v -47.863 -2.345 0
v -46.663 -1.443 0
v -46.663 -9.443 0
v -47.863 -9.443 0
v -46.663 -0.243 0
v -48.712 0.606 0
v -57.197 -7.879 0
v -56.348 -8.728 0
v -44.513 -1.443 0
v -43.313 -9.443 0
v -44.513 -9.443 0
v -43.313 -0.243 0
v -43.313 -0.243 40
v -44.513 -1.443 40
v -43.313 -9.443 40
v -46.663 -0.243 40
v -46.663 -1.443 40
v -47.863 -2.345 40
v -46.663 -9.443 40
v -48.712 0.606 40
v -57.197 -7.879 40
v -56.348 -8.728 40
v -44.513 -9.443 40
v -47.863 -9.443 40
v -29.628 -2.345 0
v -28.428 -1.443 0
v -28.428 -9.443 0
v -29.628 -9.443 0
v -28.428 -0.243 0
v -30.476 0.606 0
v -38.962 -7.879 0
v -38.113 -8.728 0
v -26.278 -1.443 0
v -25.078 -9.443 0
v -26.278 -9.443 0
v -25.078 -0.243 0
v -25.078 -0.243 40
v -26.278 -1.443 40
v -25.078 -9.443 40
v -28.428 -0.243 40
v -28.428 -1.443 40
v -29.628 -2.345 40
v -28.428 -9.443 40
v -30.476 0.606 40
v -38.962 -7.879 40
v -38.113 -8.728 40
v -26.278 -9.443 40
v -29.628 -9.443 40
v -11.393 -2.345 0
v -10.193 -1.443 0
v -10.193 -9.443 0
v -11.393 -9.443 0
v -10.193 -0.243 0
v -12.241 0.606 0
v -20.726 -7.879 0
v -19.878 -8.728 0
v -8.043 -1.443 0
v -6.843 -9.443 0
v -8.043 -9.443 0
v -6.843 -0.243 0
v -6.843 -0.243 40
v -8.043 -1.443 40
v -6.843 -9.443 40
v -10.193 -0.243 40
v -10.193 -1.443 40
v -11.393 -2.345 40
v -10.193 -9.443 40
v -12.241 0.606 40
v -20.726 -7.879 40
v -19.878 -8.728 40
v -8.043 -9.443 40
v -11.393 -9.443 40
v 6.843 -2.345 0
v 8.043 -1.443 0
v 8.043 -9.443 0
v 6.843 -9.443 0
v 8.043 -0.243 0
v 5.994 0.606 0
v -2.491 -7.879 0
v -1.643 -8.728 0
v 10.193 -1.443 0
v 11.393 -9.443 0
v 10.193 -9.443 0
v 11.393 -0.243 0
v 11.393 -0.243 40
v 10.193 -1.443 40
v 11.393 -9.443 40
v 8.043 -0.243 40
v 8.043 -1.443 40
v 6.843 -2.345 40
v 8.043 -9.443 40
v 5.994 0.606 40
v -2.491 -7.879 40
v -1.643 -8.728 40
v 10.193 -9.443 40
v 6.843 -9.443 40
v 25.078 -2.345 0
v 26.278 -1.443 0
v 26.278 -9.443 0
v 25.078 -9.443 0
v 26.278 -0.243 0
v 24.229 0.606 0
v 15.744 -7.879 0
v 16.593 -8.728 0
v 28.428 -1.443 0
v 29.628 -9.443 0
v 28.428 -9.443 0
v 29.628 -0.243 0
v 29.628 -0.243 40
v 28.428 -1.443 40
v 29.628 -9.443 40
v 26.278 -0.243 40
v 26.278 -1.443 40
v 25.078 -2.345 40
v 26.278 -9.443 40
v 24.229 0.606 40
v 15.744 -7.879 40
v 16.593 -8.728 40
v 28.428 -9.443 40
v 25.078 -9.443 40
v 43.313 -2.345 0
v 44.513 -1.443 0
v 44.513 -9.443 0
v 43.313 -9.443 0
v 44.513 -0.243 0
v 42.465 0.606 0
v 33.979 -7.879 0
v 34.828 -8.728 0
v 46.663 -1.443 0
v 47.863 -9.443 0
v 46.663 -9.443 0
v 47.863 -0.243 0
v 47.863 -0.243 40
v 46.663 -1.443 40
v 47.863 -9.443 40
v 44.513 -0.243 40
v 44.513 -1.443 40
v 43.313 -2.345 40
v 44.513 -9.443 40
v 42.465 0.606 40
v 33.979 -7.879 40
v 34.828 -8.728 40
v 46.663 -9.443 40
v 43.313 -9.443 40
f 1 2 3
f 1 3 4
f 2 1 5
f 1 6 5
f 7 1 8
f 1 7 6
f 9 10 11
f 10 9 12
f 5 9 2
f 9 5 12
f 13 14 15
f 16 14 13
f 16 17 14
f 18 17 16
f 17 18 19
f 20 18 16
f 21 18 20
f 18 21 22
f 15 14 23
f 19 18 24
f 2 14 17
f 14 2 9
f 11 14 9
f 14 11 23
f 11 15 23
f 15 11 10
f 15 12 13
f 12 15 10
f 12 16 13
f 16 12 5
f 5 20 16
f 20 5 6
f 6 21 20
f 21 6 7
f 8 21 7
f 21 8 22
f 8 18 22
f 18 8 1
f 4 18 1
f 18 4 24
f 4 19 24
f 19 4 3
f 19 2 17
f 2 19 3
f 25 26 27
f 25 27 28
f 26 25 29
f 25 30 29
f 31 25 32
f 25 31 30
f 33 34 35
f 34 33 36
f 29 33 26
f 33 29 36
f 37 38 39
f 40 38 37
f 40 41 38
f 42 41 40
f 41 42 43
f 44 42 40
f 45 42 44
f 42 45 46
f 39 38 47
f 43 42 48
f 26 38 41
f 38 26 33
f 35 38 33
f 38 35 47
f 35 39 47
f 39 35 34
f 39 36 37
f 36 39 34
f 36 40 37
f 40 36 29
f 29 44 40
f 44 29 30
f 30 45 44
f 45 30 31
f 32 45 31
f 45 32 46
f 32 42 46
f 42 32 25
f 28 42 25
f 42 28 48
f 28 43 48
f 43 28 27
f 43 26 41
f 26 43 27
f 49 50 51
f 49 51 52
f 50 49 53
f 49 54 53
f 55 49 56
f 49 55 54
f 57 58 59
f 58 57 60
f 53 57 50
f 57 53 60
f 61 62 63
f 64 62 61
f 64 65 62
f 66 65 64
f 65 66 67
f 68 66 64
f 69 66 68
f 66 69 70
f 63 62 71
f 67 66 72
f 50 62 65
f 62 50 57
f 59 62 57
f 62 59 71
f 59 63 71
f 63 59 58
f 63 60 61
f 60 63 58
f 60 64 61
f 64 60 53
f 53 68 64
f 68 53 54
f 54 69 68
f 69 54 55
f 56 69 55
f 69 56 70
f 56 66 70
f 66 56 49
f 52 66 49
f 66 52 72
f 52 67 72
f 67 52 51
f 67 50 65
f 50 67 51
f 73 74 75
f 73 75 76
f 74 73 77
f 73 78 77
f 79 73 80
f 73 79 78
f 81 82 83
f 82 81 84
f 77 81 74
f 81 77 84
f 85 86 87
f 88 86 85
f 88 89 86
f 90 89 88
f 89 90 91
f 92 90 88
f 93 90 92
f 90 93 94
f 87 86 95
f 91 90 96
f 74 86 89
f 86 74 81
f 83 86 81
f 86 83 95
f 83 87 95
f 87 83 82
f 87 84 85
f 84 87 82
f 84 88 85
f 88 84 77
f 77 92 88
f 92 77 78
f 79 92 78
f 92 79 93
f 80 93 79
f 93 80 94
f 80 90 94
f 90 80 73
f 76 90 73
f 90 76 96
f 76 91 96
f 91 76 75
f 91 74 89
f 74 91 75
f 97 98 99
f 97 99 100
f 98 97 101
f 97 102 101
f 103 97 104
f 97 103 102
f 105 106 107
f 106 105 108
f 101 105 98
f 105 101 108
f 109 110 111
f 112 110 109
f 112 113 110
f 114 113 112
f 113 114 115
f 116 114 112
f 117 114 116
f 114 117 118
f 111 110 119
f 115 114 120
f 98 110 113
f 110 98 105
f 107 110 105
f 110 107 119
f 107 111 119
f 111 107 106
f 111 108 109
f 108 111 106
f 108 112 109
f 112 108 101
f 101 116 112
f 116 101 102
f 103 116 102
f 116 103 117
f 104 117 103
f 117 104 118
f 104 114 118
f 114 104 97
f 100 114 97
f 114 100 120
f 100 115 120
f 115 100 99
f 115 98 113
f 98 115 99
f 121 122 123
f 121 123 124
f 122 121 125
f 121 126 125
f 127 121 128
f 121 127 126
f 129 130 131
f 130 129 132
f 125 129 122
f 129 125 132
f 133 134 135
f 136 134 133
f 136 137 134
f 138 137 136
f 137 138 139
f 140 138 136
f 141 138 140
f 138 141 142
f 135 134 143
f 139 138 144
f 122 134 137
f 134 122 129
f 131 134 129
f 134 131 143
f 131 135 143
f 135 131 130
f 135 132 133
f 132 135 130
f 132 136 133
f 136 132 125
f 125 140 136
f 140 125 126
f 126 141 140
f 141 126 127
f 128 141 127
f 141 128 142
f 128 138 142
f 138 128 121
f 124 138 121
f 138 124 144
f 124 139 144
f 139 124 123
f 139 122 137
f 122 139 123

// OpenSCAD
// The Drawer Dividers V3 – Label clip
// Slides onto the top edge of a wall: write on it, add a sticker or engrave a text.

/* [Part] */
// Text engraved into the face ("" = blank, write on it)
Clip_Text = "";
// Clip width along the wall (mm)
Clip_Width = 40; // [15:1:120]
// Height of the slanted face (mm)
Face_Height = 12; // [6:0.5:30]
// Angle of the face (degrees, 0 = upright)
Face_Angle = 45; // [0:5:80]
// How far the clip reaches down the wall (mm)
Grip_Depth = 8; // [3:0.5:20]
// Text size (mm)
Text_Size = 5; // [2:0.5:15]
// How many copies on the plate
Count = 6; // [1:1:40]
// Gap between copies (mm)
Spacing = 4; // [1:1:20]

/* [System] */
// Exact thickness of your printed walls (mm)
Wall_Thickness = 2.0; // [0.8:0.1:10]
// Material thickness of the clip (mm)
Clip_Wall = 1.2; // [0.6:0.1:3]
// Extra room for the wall – smaller = tighter (mm)
Clip_Fit = 0.15; // [0:0.05:0.6]

/* [Hidden] */
$fn = 32;

P = dd_profile(wall_t = Wall_Thickness);
sz = dd_label_clip_size(P, Face_Height, Face_Angle, Grip_Depth, Clip_Wall);
dd_grid(Count, sz[0] + Spacing, sz[1] + Spacing)
    translate([0, Grip_Depth - sz[1] / 2, 0])
        dd_label_clip(Clip_Width, P, face = Face_Height, angle = Face_Angle, grip = Grip_Depth,
                      wall = Clip_Wall, fit = Clip_Fit, label = Clip_Text, text_size = Text_Size);

// ============================================================================
//  Library (scad/lib/drawer_divider.scad, inlined by tools/build.py)
// ============================================================================
// =============================================================================
//  The Drawer Dividers – core library (V3)
//  Usage:  use <lib/drawer_divider.scad>
//  All dimensions in mm. This file creates no geometry on its own.
// =============================================================================

DD_VERSION = "3.0.0";
DD_EPS = 0.01;

// =============================================================================
//  System profile
// =============================================================================
// Every part of one drawer is built from the same profile, so walls,
// connectors and rails always fit each other. A profile is a key/value list;
// read single values with dd(p, "key").

function dd_profile(
    wall_t   = 2.0,  // thickness of the printed walls
    tol      = 0.2,  // extra slot width so the wall does not bind
    height   = 40,   // connector height
    insert   = 14,   // how deep a wall slides into a connector arm
    shell    = 2.5,  // connector material left and right of the slot
    arm      = 20,   // arm length, measured from the connector centre
    fillet   = 10,   // inner fillet radius between two arms
    edge_r   = 0.6,  // rounding of the outer vertical edges
    cap      = 0,    // closed cap; 0 = slots open on both ends
    floor_t  = 2,    // cap thickness of slip-on connectors
    lead_in  = 1,    // chamfer at the open slot end
    efc      = 0.4,  // elephant foot compensation at the bed side
    magnet_d = 5,    // magnet / rubber foot pocket, 0 = off
    magnet_h = 2,
    end_gap  = 0.3,  // gap between wall end and pocket bottom
    top_gap  = 0.2   // gap between wall top and cap (capped connectors only)
) = [
    ["wall_t", wall_t], ["tol", tol], ["height", height], ["insert", insert],
    ["shell", shell], ["arm", arm], ["fillet", fillet], ["edge_r", edge_r],
    ["cap", cap], ["floor_t", floor_t], ["lead_in", lead_in], ["efc", efc],
    ["magnet_d", magnet_d], ["magnet_h", magnet_h], ["end_gap", end_gap],
    ["top_gap", top_gap]
];

function dd(p, key) =
    let(i = search([key], p)[0])
    assert(is_num(i), str("dd(): unknown profile key '", key, "'"))
    p[i][1];

// ---- derived values (the designer uses the same formulas) -------------------
// centre distance two connectors on one wall need so their arms do not collide
function dd_min_conn_gap(p) = 2 * dd(p, "arm") + 1;
function dd_slot_w(p)       = dd(p, "wall_t") + dd(p, "tol");
function dd_arm_w(p)        = dd_slot_w(p) + 2 * dd(p, "shell");
function dd_pocket_start(p) = dd(p, "arm") - dd(p, "insert");
// distance from a connector centre to the end of a fully inserted wall
function dd_wall_inset(p)   = dd_pocket_start(p) + dd(p, "end_gap");
function dd_cap(p, slip = false) =
    slip ? max(dd(p, "cap"), dd(p, "floor_t")) : dd(p, "cap");
function dd_wall_height(p, slip = false) =
    let(c = dd_cap(p, slip))
    dd(p, "height") - (c > 0 ? c + dd(p, "top_gap") : 0);
// wall length for two connector centres `center_dist` apart
function dd_wall_length(center_dist, p, ends = 2) =
    center_dist - ends * dd_wall_inset(p);

// =============================================================================
//  Connectors
// =============================================================================
// Directions: 0 = +X, 1 = +Y, 2 = -X, 3 = -Y.
// Definition: [arms, slots, through_y, slip_on]
//   through_y: one continuous slot along Y (the wall passes straight through)
//   slip_on:   printed cap-down, then flipped and pushed onto the walls

function dd_connector_types() = ["cross", "tee", "corner", "corner_round", "straight", "end",
                                  "slip_cross", "slip_tee", "slip_corner_r", "slip_corner_l"];

function dd_connector_def(type) =
    type == "cross"         ? [[1,1,1,1], [1,1,1,1], false, false] :
    type == "tee"           ? [[1,1,1,0], [1,1,1,0], false, false] :
    type == "corner"        ? [[1,1,0,0], [1,1,0,0], false, false] :
    type == "corner_round"  ? [[1,1,0,0], [1,1,0,0], false, false] :   // frame corner, use corner_r
    type == "straight"      ? [[1,0,1,0], [1,0,1,0], false, false] :
    type == "end"           ? [[1,0,0,0], [1,0,0,0], false, false] :
    type == "slip_cross"    ? [[1,1,1,1], [1,1,1,1], true,  true ] :
    type == "slip_tee"      ? [[1,1,0,1], [1,1,0,1], true,  true ] :
    type == "slip_corner_r" ? [[1,1,0,0], [1,1,0,1], true,  true ] :
    type == "slip_corner_l" ? [[0,1,1,0], [0,1,1,1], true,  true ] :
    undef;

// slip = true: part of a slip-on set. Every connector of the set gets the cap and
// is pushed on from above, also where the walls end instead of running through.
// corner_r rounds the outer corner, so a frame corner fits a drawer with rounded
// corners (see dd_corner_r_max()).
module dd_connector(type = "cross", p = dd_profile(), slip = false, corner_r = 0) {
    def = dd_connector_def(type);
    assert(!is_undef(def), str("dd_connector(): unknown type '", type, "'"));
    dd_connector_custom(arms = def[0], slots = def[1], through_y = def[2],
                        cap = dd_cap(p, def[3] || slip), p = p, corner_r = corner_r);
}

// largest outer corner radius that still leaves 0.8 mm beside the slots
function dd_corner_r_max(p) =
    let(a = dd_arm_w(p) / 2, dx = dd_pocket_start(p) + a, dy = a - dd_slot_w(p) / 2 - 0.8)
    dy <= 0 ? dx : dx + dy + sqrt(2 * dx * dy);

// Build any connector from an arm/slot pattern.
module dd_connector_custom(arms = [1,1,1,1], slots = undef, through_y = false,
                           cap = 0, p = dd_profile(), corner_r = 0) {
    sl  = is_undef(slots) ? arms : slots;
    h   = dd(p, "height");
    aw  = dd_arm_w(p);
    arm = dd(p, "arm");
    ps  = dd_pocket_start(p);
    md  = dd(p, "magnet_d");
    z0  = cap > 0 ? cap : -1;   // slots start above the cap

    difference() {
        linear_extrude(h) dd_connector_outline(arms, p, corner_r);

        for (i = [0:3]) if (sl[i] && !(through_y && i == 3))
            rotate(90 * i)
                dd_slot_cut(x0 = (through_y && i == 1) ? -(arm + 1) : ps,
                            x1 = arm + 1, z0 = z0, p = p);

        // magnet pocket on the side that faces the drawer floor in use
        if (!through_y && md > 0 && md <= min(aw, 2 * ps) - 1) {
            mh = dd(p, "magnet_h");
            if (cap > 0) translate([0, 0, h - mh]) cylinder(d = md, h = mh + 1, $fn = 48);
            else translate([0, 0, -DD_EPS]) cylinder(d = md, h = mh + DD_EPS, $fn = 48);
        }
    }
}

module dd_connector_outline(arms, p, corner_r = 0) {
    aw = dd_arm_w(p);
    rc = min(corner_r, dd_corner_r_max(p));
    difference() {
        dd_round_convex(dd(p, "edge_r"))
        // a fillet longer than the free arm would swallow the arm ends
        dd_round_concave(min(dd(p, "fillet"), dd(p, "arm") - aw / 2))
        union() {
            square(aw, center = true);
            for (i = [0:3]) if (arms[i])
                rotate(90 * i) translate([0, -aw / 2]) square([dd(p, "arm"), aw]);
        }
        // outer corners between two missing arms
        if (rc > 0) for (i = [0:3]) if (!arms[i] && !arms[(i + 1) % 4])
            rotate(90 * i) translate([aw / 2 - rc, aw / 2 - rc]) difference() {
                square(rc + 1);
                circle(r = rc, $fn = 64);
            }
    }
}

// one slot along +X from x0 to x1, open at the top
module dd_slot_cut(x0, x1, z0, p) {
    h    = dd(p, "height");
    sw   = dd_slot_w(p);
    li   = dd(p, "lead_in");
    efc  = dd(p, "efc");
    len  = x1 - x0;

    translate([x0, -sw / 2, z0]) cube([len, sw, h - z0 + 1]);

    if (li > 0) hull() {
        translate([x0, -sw / 2, h - li]) cube([len, sw, DD_EPS]);
        translate([x0, -sw / 2 - li, h]) cube([len, sw + 2 * li, 1]);
    }
    // only where the slot touches the print bed
    if (z0 < 0 && efc > 0) hull() {
        translate([x0, -sw / 2 - efc, -1]) cube([len, sw + 2 * efc, 1]);
        translate([x0, -sw / 2, efc]) cube([len, sw, DD_EPS]);
    }
}

// footprint size, used to space copies on the plate
function dd_connector_size(p) = 2 * dd(p, "arm");

// A connector as it sits in the drawer (cap on top), for assembly previews.
// The slots stay open so the walls show inside them; through = "x"|"y"|"" for slip-on.
module dd_connector_installed(arms, through = "", cap = 0, p = dd_profile(), corner_r = 0) {
    h   = dd(p, "height");
    arm = dd(p, "arm");
    ps  = dd_pocket_start(p);
    sw  = dd_slot_w(p);
    linear_extrude(h - cap) difference() {
        dd_connector_outline(arms, p, corner_r);
        for (i = [0:3]) if (arms[i])
            rotate(90 * i) translate([ps, -sw / 2]) square([arm + 1 - ps, sw]);
        if (through != "")
            rotate(through == "x" ? 0 : 90) square([2 * arm + 2, sw], center = true);
    }
    if (cap > 0) translate([0, 0, h - cap]) linear_extrude(cap) dd_connector_outline(arms, p, corner_r);
}

// =============================================================================
//  Walls
// =============================================================================
// Built standing: X = length, Y = thickness (centred), Z = height.

// label / label2: engraved into the wall ends that disappear in the connectors,
// label upright at +X (the parts-list letter), label2 running upwards at -X (the length).
module dd_wall(length, p = dd_profile(), height = undef, pattern = "none",
               cell = 8, web = 2, margin_side = -1, margin_tb = 5,
               end_chamfer = 0.5, grip = 0, label = "", label2 = "") {
    h  = is_undef(height) ? dd_wall_height(p) : height;
    t  = dd(p, "wall_t");
    // keep the pattern out of the connector pockets
    ms = margin_side < 0 ? dd(p, "insert") + 2 : margin_side;

    difference() {
        linear_extrude(h) dd_wall_2d(length, t, end_chamfer);
        dd_wall_pattern(length, t, h, pattern, cell, web, ms,
                        margin_tb, margin_tb + grip);
        if (grip > 0)
            translate([0, 0, h]) rotate([90, 0, 0])
                cylinder(r = grip, h = t + 2, center = true, $fn = 48);
        dd_wall_labels(length, t, h, dd(p, "insert") - dd(p, "end_gap"), label, label2);
    }
}

module dd_wall_labels(l, t, h, lw, label, label2) {
    dep = min(0.4, t / 4);
    both = l >= 2 * lw + 2;
    module engrave(x, z, s, txt, up)
        translate([x, -t / 2 + dep, z]) rotate([90, 0, 0]) linear_extrude(dep + 1)
            rotate(up ? 90 : 0) text(txt, size = s, halign = "center", valign = "center");
    if (label != "") {
        s = min(7, (both ? lw : l) - 4, h / 3);
        if (s >= 2) engrave(both ? l / 2 - lw / 2 : 0, h / 2, s, label, false);
    }
    if (label2 != "" && both) {
        s = min(4, lw - 4, (h - 8) / (0.75 * len(label2) + 1));
        if (s >= 2) engrave(-l / 2 + lw / 2, h / 2, s, label2, true);
    }
}

module dd_wall_2d(l, t, c) {
    ce = min(c, t / 2 - 0.01);
    if (ce > 0)
        polygon([
            [-l/2 + ce, -t/2], [ l/2 - ce, -t/2], [ l/2, -t/2 + ce], [ l/2,  t/2 - ce],
            [ l/2 - ce,  t/2], [-l/2 + ce,  t/2], [-l/2,  t/2 - ce], [-l/2, -t/2 + ce]
        ]);
    else
        square([l, t], center = true);
}

// Hex or circle pattern with a constant web between the holes.
module dd_wall_pattern(l, t, h, pattern, cell, web, ms, mb, mt) {
    if (pattern == "hex" || pattern == "circle") {
        hex   = pattern == "hex";
        D     = hex ? cell * sqrt(3) + web : 2 * cell + web;  // vertical pitch
        ext_x = cell;
        ext_z = hex ? cell * sqrt(3) / 2 : cell;
        max_w = l - 2 * ms - 2 * ext_x;
        max_h = h - mb - mt - 2 * ext_z;
        stagger = max_h >= D / 2;
        sx    = stagger ? D * sqrt(3) / 2 : 2 * cell + web;
        cols  = max_w >= 0 ? floor(max_w / sx) + 1 : 0;
        st    = stagger && cols > 1;
        rows  = max_h >= 0 ? floor((max_h - (st ? D / 2 : 0)) / D) + 1 : 0;

        if (cols > 0 && rows > 0) {
            pw = (cols - 1) * sx;
            ph = (rows - 1) * D + (st ? D / 2 : 0);
            z0 = mb + ext_z + (max_h - ph) / 2;
            for (c = [0 : cols - 1], r = [0 : rows - 1])
                translate([-pw / 2 + c * sx, 0, z0 + r * D + (st && c % 2 == 1 ? D / 2 : 0)])
                    rotate([90, 0, 0])
                        cylinder(r = cell, h = t + 2, center = true, $fn = hex ? 6 : 32);
        }
    }
}

// =============================================================================
//  Rails ("Raster Wall") – glued or screwed to the drawer side
// =============================================================================
// Built flat: X = length, Y = width (= height in the drawer), Z = thickness.
// Teeth form slots of the system slot width. teeth_offset = position of the
// first tooth from x = 0; -1 centres the pattern. Joined rails use explicit
// offsets so the slot pitch continues across the joint.

function dd_rail_pitch(p, tooth_t = 2) = tooth_t + dd_slot_w(p);

function dd_rail_center_offset(length, p, tooth_t = 2) =
    let(sw = dd_slot_w(p), pitch = tooth_t + sw,
        n = max(1, floor((length + sw) / pitch)),
        used = n * tooth_t + (n - 1) * sw)
    (length - used) / 2;

module dd_rail(length, width, p = dd_profile(), plate = 2.5, tooth_t = 2,
               tooth_h = 6, tooth_chamfer = 0.6, tooth_fillet = 0.5,
               teeth_offset = -1, teeth = true, tongue = true, socket = true,
               tongue_len = 2, tongue_w = -1, tongue_chamfer = 1,
               tol_w = 1, tol_d = 0.5, tol_z = 0.1,
               screws = 3, screw_d = 3.2, head_d = 6.5) {
    sw    = dd_slot_w(p);
    pitch = tooth_t + sw;
    x0    = teeth_offset >= 0 ? teeth_offset : dd_rail_center_offset(length, p, tooth_t);
    n     = floor((length - x0 - tooth_t) / pitch) + 1;
    tw    = tongue_w < 0 ? max(width - 12, width * 0.6) : min(tongue_w, width - 4);
    zt    = plate / 2 - tol_z / 2;
    zs    = plate / 2 + tol_z / 2;

    difference() {
        union() {
            cube([length, width, plate]);
            if (tongue)
                translate([length, (width - tw) / 2, 0]) linear_extrude(zt)
                    polygon([[0, 0], [tongue_len, tongue_chamfer],
                             [tongue_len, tw - tongue_chamfer], [0, tw]]);
            if (teeth && n > 0)
                for (i = [0 : n - 1])
                    translate([x0 + i * pitch, 0, plate - DD_EPS])
                        dd_rail_tooth(width, tooth_t, tooth_h, tooth_chamfer, tooth_fillet);
        }
        if (socket) {
            bw = tw + 2 * tol_w;
            translate([-DD_EPS, (width - bw) / 2, -DD_EPS])
                cube([tongue_len + tol_d + DD_EPS, bw, zs + DD_EPS]);
        }
        // screws sit in the middle of a slot so they damage as few teeth as possible
        if (screws > 0) for (s = [1 : screws]) {
            // nearest slot, kept on the rail when it is short
            k  = max(0, min(n - 2, round((length * s / (screws + 1) - x0 - tooth_t - sw / 2) / pitch)));
            xs = x0 + tooth_t + sw / 2 + k * pitch;
            cs = min(1.5, plate - 0.4);
            translate([xs, width / 2, 0]) {
                translate([0, 0, -1]) cylinder(d = screw_d, h = plate + 2, $fn = 32);
                translate([0, 0, plate - cs]) cylinder(d1 = screw_d, d2 = head_d, h = cs + DD_EPS, $fn = 32);
                translate([0, 0, plate]) cylinder(d = head_d + 0.5, h = tooth_h + 1, $fn = 32);
            }
        }
    }
}

// One tooth across the full rail width, with lead-in chamfer and base fillets.
// Keep tooth_fillet <= the wall end chamfer so walls still reach the plate.
module dd_rail_tooth(width, tt, th, ch, fr) {
    c = max(0, min(ch, tt / 2 - 0.2, th - 0.5));
    translate([0, width, 0]) rotate([90, 0, 0]) linear_extrude(width) {
        polygon([[0, 0], [tt, 0], [tt, th - c], [tt - c, th], [c, th], [0, th - c]]);
        if (fr > 0) {
            translate([tt, 0]) dd_fillet_2d(fr);
            mirror([1, 0]) dd_fillet_2d(fr);
        }
    }
}

// =============================================================================
//  Label clip
// =============================================================================
// Slides onto the top edge of a wall; the slanted face takes a marker, a sticker
// or an engraved text. Built in print orientation: the profile lies on the bed
// (X = across the wall, Y = up in use) and is extruded by the clip width.

module dd_label_clip(width = 40, p = dd_profile(), face = 12, angle = 45, grip = 8,
                     wall = 1.2, fit = 0.15, label = "", text_size = 5) {
    gap = dd(p, "wall_t") + fit;
    d   = [-cos(angle), -sin(angle)];   // down the face, away from the wall
    n   = [-sin(angle),  cos(angle)];   // face normal
    hp  = [-gap / 2 - wall, wall];      // hinge: top front corner of the clip
    difference() {
        linear_extrude(width) {
            difference() {
                translate([-gap / 2 - wall, -grip]) square([gap + 2 * wall, grip + wall]);
                translate([-gap / 2, -grip - 1]) square([gap, grip + 1]);
            }
            // the hull fills the joint, so face and clip share more than one edge
            hull() {
                translate(hp - [0, wall]) square([wall, wall]);
                polygon([hp, hp + face * d, hp + face * d + wall * n, hp + wall * n]);
            }
        }
        if (label != "") {
            c = hp + wall * n + d * face / 2;
            dep = min(0.4, wall / 3);
            multmatrix([[0, -d[0], n[0], c[0]], [0, -d[1], n[1], c[1]], [1, 0, 0, width / 2], [0, 0, 0, 1]])
                translate([0, 0, -dep]) linear_extrude(dep + 1)
                    text(label, size = min(text_size, face - 3), halign = "center", valign = "center");
        }
    }
}

// footprint of one clip on the bed (x, y)
function dd_label_clip_size(p, face = 12, angle = 45, grip = 8, wall = 1.2) =
    [dd(p, "wall_t") + 0.15 + 2 * wall + face * cos(angle) + wall, grip + wall + face * sin(angle) + wall];

// =============================================================================
//  Tolerance test
// =============================================================================
// A bar with one slot per tolerance (value engraved next to it) plus a short
// test wall. Print both, find the slot that fits best, use that tolerance.

module dd_tolerance_test(p = dd_profile(), tols = [0.1, 0.15, 0.2, 0.25, 0.3],
                         height = 12, depth = 20, land = 8, base = 1.2,
                         coupon = true) {
    t = dd(p, "wall_t");
    n = len(tols);
    function x_at(i) = land * (i + 1) + i * t + dd_sum(tols, i);
    L = x_at(n);

    difference() {
        cube([L, depth, height]);
        for (i = [0 : n - 1]) {
            translate([x_at(i), -1, base]) cube([t + tols[i], depth + 2, height]);
            translate([x_at(i) - land / 2, depth / 2, height - 0.6])
                linear_extrude(1) rotate(90)
                    text(str(tols[i]), size = min(3.2, land * 0.42),
                         halign = "center", valign = "center");
        }
    }
    if (coupon)
        translate([L / 2, depth + 8, 0])
            dd_wall(30, p, height = height + 4, end_chamfer = 0.3);
}

// =============================================================================
//  Helpers
// =============================================================================

function dd_sum(v, n) = n <= 0 ? 0 : v[n - 1] + dd_sum(v, n - 1);

module dd_round_concave(r) { if (r > 0) offset(r = -r) offset(r = r) children(); else children(); }
module dd_round_convex(r)  { if (r > 0) offset(r = r) offset(delta = -r) children(); else children(); }

module dd_fillet_2d(r) {
    difference() {
        square([r, r]);
        translate([r, r]) circle(r = r, $fn = 24);
    }
}

// Arrange `count` copies of the child in rows that fit max_w, centred on the origin.
module dd_grid(count, pitch_x, pitch_y, max_w = 240) {
    cols = max(1, min(count, floor((max_w + DD_EPS) / pitch_x)));
    rows = ceil(count / cols);
    for (i = [0 : count - 1])
        translate([((i % cols) - (cols - 1) / 2) * pitch_x,
                   (floor(i / cols) - (rows - 1) / 2) * pitch_y, 0])
            children();
}

// Lay a standing wall flat on the bed.
module dd_lay_flat(t) { translate([0, 0, t / 2]) rotate([90, 0, 0]) children(); }

// =============================================================================
//  Drawer layout – used by drawer_designer.scad
// =============================================================================
// The drawer is cut into strips (u axis), each strip into compartments
// (v axis). Strip walls run through from edge to edge. Strips run front to
// back unless `swap` is set. dd_layout() works in u/v and returns world
// coordinates: x = width, y = depth, front edge at y = 0.
// Directions: 0 = +X, 1 = +Y, 2 = -X, 3 = -Y.

function dd_le() = 0.01;   // a function, so inlined single files can use it before this line

// ---- string parsing ("1,1,2" and "2,1:2") ----------------------------------
function dd_str_split(s, sep, i = 0, cur = "", acc = []) =
    i >= len(s) ? concat(acc, [cur])
  : s[i] == sep ? dd_str_split(s, sep, i + 1, "", concat(acc, [cur]))
  : dd_str_split(s, sep, i + 1, str(cur, s[i]), acc);

function dd_str_num(s) = dd__num([for (c = s) if (c != " ") c], 0, 0, 0, 1);
function dd__num(c, i, v, frac, sign) =
    i >= len(c) ? sign * v
  : c[i] == "-" ? dd__num(c, i + 1, v, frac, -1)
  : c[i] == "." ? dd__num(c, i + 1, v, max(frac, 0.1), sign)
  : let(d = ord(c[i]) - 48)
    d < 0 || d > 9 ? dd__num(c, i + 1, v, frac, sign)
  : frac > 0 ? dd__num(c, i + 1, v + d * frac, frac / 10, sign)
             : dd__num(c, i + 1, v * 10 + d, 0, sign);

// "1,1,2" -> [1,1,2]
function dd_parse_weights(s) =
    let(v = [for (p = dd_str_split(s, ",")) let(n = dd_str_num(p)) if (n > 0) n])
    len(v) ? v : [1];

// "2,1:2" -> one weight list per strip; a plain number n = n equal parts.
// Missing entries repeat the last one.
function dd_parse_splits(s, n) =
    let(per = [for (it = dd_str_split(s, ","))
                  let(p = [for (x = dd_str_split(it, ":")) let(v = dd_str_num(x)) if (v > 0) v])
                  len(p) == 0 ? [1]
                : len(p) == 1 ? [for (k = [1 : max(1, round(p[0]))]) 1] : p])
    [for (i = [0 : n - 1]) per[min(i, len(per) - 1)]];

// ---- small list helpers ----------------------------------------------------
function dd_has_num(l, x) = len([for (y = l) if (abs(y - x) < dd_le()) 1]) > 0;
function dd_sort(a) =
    len(a) <= 1 ? a :
    let(p = a[floor(len(a) / 2)])
    concat(dd_sort([for (x = a) if (x < p) x]), [for (x = a) if (x == p) x], dd_sort([for (x = a) if (x > p) x]));
function dd_uniq_sorted(l) = [for (k = [0 : 1 : len(l) - 1]) if (k == 0 || l[k] - l[k - 1] > dd_le()) l[k]];
function dd_unique(l, i = 0, acc = []) =
    i >= len(l) ? acc : dd_unique(l, i + 1, len([for (y = acc) if (y == l[i]) 1]) ? acc : concat(acc, [l[i]]));
function dd_count(l, x) = len([for (y = l) if (y == x) 1]);
// a tie (v exactly between two, up to rounding noise) goes to the lower value, like nearestOf() in the designer
function dd_nearest(l, v) = len(l) == 0 ? v :
    let(d = [for (x = l) abs(x - v)], m = min(d)) min([for (i = [0 : len(l) - 1]) if (d[i] <= m + 1e-6) l[i]]);
function dd_fmt(v, d = 1) = str(round(v * pow(10, d)) / pow(10, d));

// ---- options ---------------------------------------------------------------
function dd_layout_opts(width = 400, depth = 300, height = 60, strips = "1,1,1",
                        splits = "2", swap = false, edge = "frame", slip = false,
                        max_len = 240, edge_gap = 0.5, clamp_gap = 1,
                        rail_plate = 2.5, tooth_t = 2, tooth_h = 6, corner_r = 0) = [
    ["width", width], ["depth", depth], ["height", height], ["strips", strips],
    ["splits", splits], ["swap", swap], ["edge", edge], ["slip", slip],
    ["max_len", max_len], ["edge_gap", edge_gap], ["clamp_gap", clamp_gap],
    ["rail_plate", rail_plate], ["tooth_t", tooth_t], ["tooth_h", tooth_h], ["corner_r", corner_r]
];

// outer radius of the frame corners for a drawer with rounded inner corners
function dd_layout_corner_r(p, o) =
    dd(o, "edge") == "frame" && dd(o, "corner_r") > 0
        ? max(0, min(dd(o, "corner_r") - dd(o, "edge_gap"), dd_corner_r_max(p))) : 0;

// Rail tooth pattern along one world axis. Rails on the left/right sides run
// the full depth; front/back rails sit between them.
function dd_lay_rail_span(axis, W, D, rt) =
    axis == "y" ? [0.5, D - 1] : [rt + 0.5, W - 2 * rt - 1];

function dd_lay_rail_slots(axis, W, D, rt, tt, p) =
    let(sp = dd_lay_rail_span(axis, W, D, rt), sw = dd_slot_w(p), pitch = tt + sw,
        n = max(1, floor((sp[1] + sw) / pitch)),
        first = sp[0] + dd_rail_center_offset(sp[1], p, tt))
    [for (k = [0 : 1 : n - 2]) first + tt + sw / 2 + k * pitch];

// interior wall centres between c0 and c1 so the *net* compartments follow the weights
function dd_lay_split(c0, c1, off, w, t) =
    let(n = len(w), net = (c1 - off) - (c0 + off) - (n - 1) * t, tot = dd_sum(w, n))
    [for (k = [1 : 1 : n - 1]) c0 + off + net * dd_sum(w, k) / tot + (k - 1) * t + t / 2];

// node: [u, v, dirs, kind ("conn"|"edge"), type, through ("u"|"v"|""), end offset, joint]
function dd_lay_node(u, v, d, edge, slip, end_off, joint = false) =
    let(n = d[0] + d[1] + d[2] + d[3])
    n == 1 && (edge == "rail" || edge == "none") ? [u, v, d, "edge", "", "", end_off, false] :
    let(t0 = n == 4 ? "cross" : n == 3 ? "tee" : n == 1 ? "end"
           : (d[0] == 1 && d[2] == 1) || (d[1] == 1 && d[3] == 1) ? "straight" : "corner",
        th = slip && n >= 3 ? (d[1] == 1 && d[3] == 1 ? "v" : "u") : "")
    [u, v, d, "conn", th == "" ? t0 : (n == 4 ? "slip_cross" : "slip_tee"), th, 0, joint];

// slip-on: positions along a through wall where it should end at a crossing instead of
// getting a joiner squeezed between two connectors (greedy, each piece <= maxlen)
function dd_lay_slip_cuts(stops, prev, last, ins, maxlen, acc = []) =
    last - prev - 2 * ins <= maxlen ? acc :
    let(ok = [for (u = stops) if (u > prev + dd_le() && u < last - dd_le() && u - prev - 2 * ins <= maxlen) u])
    len(ok) == 0 ? acc : dd_lay_slip_cuts(stops, max(ok), last, ins, maxlen, concat(acc, [max(ok)]));

function dd_lay_find(nodes, u, v) =
    let(m = [for (n = nodes) if (abs(n[0] - u) < dd_le() && abs(n[1] - v) < dd_le()) n]) m[0];

function dd_lay_align(v, m, i = 0, acc = []) =
    i >= len(v) ? acc :
    dd_lay_align(v, m, i + 1, concat(acc, [i == 0 ? v[0] :
        [for (y = v[i]) let(prev = acc[i - 1], d = [for (q = prev) abs(q - y)])
            len(prev) && min(d) < m ? prev[search(min(d), d)[0]] : y]]));

function dd_lay_off(n, ins) = n[3] == "edge" ? n[6] : ins;

// joints that split a too long wall, kept clear of other connectors on the line
function dd_lay_kpieces(total, ins, maxlen, k = 1) =
    (total - (k - 1) * 2 * ins) / k <= maxlen || k >= 50 ? k : dd_lay_kpieces(total, ins, maxlen, k + 1);

function dd_lay_joints(u0, u1, o0, o1, ins, maxlen, avoid, clear) =
    let(total = u1 - u0 - o0 - o1, k = dd_lay_kpieces(total, ins, maxlen),
        pl = (total - (k - 1) * 2 * ins) / k)
    k <= 1 ? [] : dd__joints(1, k, u0 + o0, pl, ins, maxlen, avoid, clear, []);

function dd__joints(j, k, start, pl, ins, maxlen, avoid, clear, acc) =
    j >= k ? acc :
    let(ideal = start + j * pl + (2 * j - 1) * ins,
        prev  = len(acc) ? acc[len(acc) - 1] + ins : start,
        cands = [for (d = [0 : 2.5 : 80], c = [ideal + d, ideal - d])
                    if (len([for (a = avoid) if (abs(a - c) < clear) 1]) == 0 && c - ins - prev <= maxlen) c])
    dd__joints(j + 1, k, start, pl, ins, maxlen, avoid, clear, concat(acc, [len(cands) ? cands[0] : ideal]));

// cuts: [[u, offset], ...] -> [pieces [[ori, c, s, e]], joints [[ori, c, u]]]
function dd_lay_line(ori, c, cuts, avoid, ins, maxlen, clear) =
    let(segs = [for (k = [0 : 1 : len(cuts) - 2])
        let(u0 = cuts[k][0], o0 = cuts[k][1], u1 = cuts[k + 1][0], o1 = cuts[k + 1][1],
            js = dd_lay_joints(u0, u1, o0, o1, ins, maxlen,
                               [for (a = avoid) if (a > u0 + dd_le() && a < u1 - dd_le()) a], clear),
            b  = concat([u0 + o0], [for (jc = js) each [jc - ins, jc + ins]], [u1 - o1]))
        [[for (m = [0 : 2 : len(b) - 2]) [ori, c, b[m], b[m + 1]]], js]])
    [[for (s = segs) each s[0]], [for (s = segs) for (jc = s[1]) [ori, c, jc]]];

// Returns a key/value list:
//   walls  [[axis "x"|"y", c, start, end, length], ...]   axis = direction the wall runs
//   conns  [[type, x, y, dirs, through "x"|"y"|"", joint], ...]
//   rails  [[side "L"|"R"|"F"|"B", start, end, length, teeth_offset, tongue, socket, screws], ...]
//   comps  [[x0, y0, x1, y1, net_w, net_d], ...]
//   wall_h, rail_w, rail_t, inset
function dd_layout(p, o) =
    let(
        W = dd(o, "width"), D = dd(o, "depth"), swap = dd(o, "swap"),
        U = swap ? D : W, V = swap ? W : D,
        edge = dd(o, "edge"), slip = dd(o, "slip"), frame = edge == "frame", rail = edge == "rail",
        maxlen = dd(o, "max_len"),
        t = dd(p, "wall_t"), aw = dd_arm_w(p), ins = dd_wall_inset(p),
        tt = dd(o, "tooth_t"), rt = dd(o, "rail_plate") + dd(o, "tooth_h"),
        B = (frame || edge == "endcap") ? aw / 2 + dd(o, "edge_gap") : 0,
        base = frame ? B : 0,
        eoff = frame ? t / 2 : rail ? rt : 0,
        end_off = rail ? dd(o, "rail_plate") + dd(p, "end_gap") : dd(o, "clamp_gap"),
        clear = 2 * dd(p, "arm") + 2,
        cols = dd_parse_weights(dd(o, "strips")), ncol = len(cols),
        rows = dd_parse_splits(dd(o, "splits"), ncol),
        su = rail ? dd_lay_rail_slots(swap ? "y" : "x", W, D, rt, tt, p) : [],
        sv = rail ? dd_lay_rail_slots(swap ? "x" : "y", W, D, rt, tt, p) : [],
        us = concat([base], [for (x = dd_lay_split(base, U - base, eoff, cols, t)) rail ? dd_nearest(su, x) : x], [U - base]),
        // compartment borders that almost line up with the neighbouring strip snap onto it,
        // otherwise the arms of the two connectors on the strip wall would collide
        // two borders snapped onto the same place (or rail slot) are one wall, not two stacked ones
        vsi = [for (r = dd_lay_align([for (i = [0 : ncol - 1])
                  [for (y = dd_lay_split(base, V - base, eoff, rows[i], t)) rail ? dd_nearest(sv, y) : y]],
                  dd_min_conn_gap(p))) dd_uniq_sorted(dd_sort(r))],

        // nodes on the through-running strip walls (and the frame sides)
        vjs = frame ? [for (j = [0 : ncol]) j] : [for (j = [1 : 1 : ncol - 1]) j],
        vstops = [for (j = [0 : ncol])
                     dd_uniq_sorted(dd_sort(concat([B, V - B], j >= 1 ? vsi[j - 1] : [], j < ncol ? vsi[j] : [])))],
        // slip-on: crossings where too long through walls end (they become normal connectors)
        vcut = [for (j = [0 : ncol]) slip ? dd_lay_slip_cuts(vstops[j], B, V - B, ins, maxlen) : []],
        fcut = slip && frame ? dd_lay_slip_cuts([for (k = [1 : 1 : ncol - 1]) us[k]], us[0], us[ncol], ins, maxlen) : [],
        vnodes = [for (j = vjs, v = vstops[j])
            let(isEnd = abs(v - B) < dd_le() || abs(v - (V - B)) < dd_le(),
                slipHere = slip && !(isEnd ? dd_has_num(fcut, us[j]) : dd_has_num(vcut[j], v)),
                d = [(j < ncol && dd_has_num(vsi[j], v)) || (frame && isEnd && j < ncol) ? 1 : 0,
                     v < V - B - dd_le() ? 1 : 0,
                     (j >= 1 && dd_has_num(vsi[j - 1], v)) || (frame && isEnd && j > 0) ? 1 : 0,
                     v > B + dd_le() ? 1 : 0])
            dd_lay_node(us[j], v, d, edge, slipHere, end_off)],
        // compartment walls that end at the drawer side
        hnodes = frame ? [] : concat(
            [for (v = vsi[0]) dd_lay_node(B, v, [1, 0, 0, 0], edge, slip, end_off)],
            [for (v = vsi[ncol - 1]) dd_lay_node(U - B, v, [0, 0, 1, 0], edge, slip, end_off)]),
        nodes = concat(vnodes, hnodes),

        vlines = [for (j = vjs)
            dd_lay_line("v", us[j],
                [for (v = vstops[j]) let(n = dd_lay_find(nodes, us[j], v))
                    if (abs(v - B) < dd_le() || abs(v - (V - B)) < dd_le() || n[5] != "v") [v, dd_lay_off(n, ins)]],
                vstops[j], ins, maxlen, clear)],
        hlines = [for (i = [0 : ncol - 1], v = vsi[i])
            let(ua = i == 0 ? B : us[i], ub = i == ncol - 1 ? U - B : us[i + 1])
            dd_lay_line("u", v, [[ua, dd_lay_off(dd_lay_find(nodes, ua, v), ins)],
                                 [ub, dd_lay_off(dd_lay_find(nodes, ub, v), ins)]],
                        [], ins, maxlen, clear)],
        flines = frame ? [for (v = [B, V - B])
            dd_lay_line("u", v, [for (k = [0 : ncol]) if (k == 0 || k == ncol || !slip || dd_has_num(fcut, us[k])) [us[k], ins]],
                        us, ins, maxlen, clear)] : [],
        lines = concat(vlines, hlines, flines),
        pieces = [for (l = lines) each l[0]],
        joints = [for (l = lines, jn = l[1])
            dd_lay_node(jn[0] == "u" ? jn[2] : jn[1], jn[0] == "u" ? jn[1] : jn[2],
                        jn[0] == "u" ? [1, 0, 1, 0] : [0, 1, 0, 1], edge, false, 0, true)],
        lconns = concat([for (n = nodes) if (n[3] == "conn") n], joints),

        // world coordinates
        walls = [for (pc = pieces)
            [(pc[0] == "u") != swap ? "x" : "y", pc[1], pc[2], pc[3], pc[3] - pc[2]]],
        cr = dd_layout_corner_r(p, o),
        isCorner = function(n) n[4] == "corner" && cr > 0
            && (abs(n[0] - B) < dd_le() || abs(n[0] - (U - B)) < dd_le())
            && (abs(n[1] - B) < dd_le() || abs(n[1] - (V - B)) < dd_le()),
        conns = [for (n = lconns)
            [isCorner(n) ? "corner_round" : n[4], swap ? n[1] : n[0], swap ? n[0] : n[1],
             swap ? [n[2][1], n[2][0], n[2][3], n[2][2]] : n[2],
             n[5] == "" ? "" : ((n[5] == "u") != swap ? "x" : "y"), n[7]]],

        // rails: one or more pieces per drawer side that has wall ends
        wall_h = dd_wall_height(p, slip),
        rail_w = min(wall_h, dd(o, "height")),
        uEdges = rail ? [len(vsi[0]) > 0, len(vsi[ncol - 1]) > 0] : [false, false],
        vEdges = rail ? [ncol > 1, ncol > 1] : [false, false],
        sides = [for (s = [["L", swap ? vEdges[0] : uEdges[0]], ["R", swap ? vEdges[1] : uEdges[1]],
                           ["F", swap ? uEdges[0] : vEdges[0]], ["B", swap ? uEdges[1] : vEdges[1]]]) if (s[1]) s[0]],
        pitch = tt + dd_slot_w(p),
        rails = [for (side = sides)
            let(axis = side == "L" || side == "R" ? "y" : "x",
                sp = dd_lay_rail_span(axis, W, D, rt),
                first = sp[0] + dd_rail_center_offset(sp[1], p, tt),
                k = ceil(sp[1] / maxlen), pl = sp[1] / k)
            for (i = [0 : k - 1])
                let(ps = sp[0] + i * pl)
                [side, ps, ps + pl, pl, ((first - ps) % pitch + pitch) % pitch, i < k - 1, i > 0,
                 max(1, round(pl / 70))]],

        // compartments with their net (inside) size
        comps = [for (i = [0 : ncol - 1])
            let(vs = concat([base], vsi[i], [V - base]), u0 = us[i], u1 = us[i + 1])
            for (k = [0 : len(vs) - 2])
                let(v0 = vs[k], v1 = vs[k + 1],
                    so = [for (c = [[u0, U], [u1, U], [v0, V], [v1, V]])
                             abs(c[0]) < dd_le() || abs(c[0] - c[1]) < dd_le() ? (rail ? rt : 0) : t / 2],
                    nu = u1 - u0 - so[0] - so[1], nv = v1 - v0 - so[2] - so[3])
                swap ? [v0, u0, v1, u1, nv, nu] : [u0, v0, u1, v1, nu, nv]]
    ) [
        ["walls", walls], ["conns", conns], ["rails", rails], ["comps", comps],
        ["wall_h", wall_h], ["rail_w", rail_w], ["rail_t", rt], ["inset", B]
    ];

// ---- parts list ------------------------------------------------------------
function dd_wall_len_round(l) = floor(l * 10 + 0.05) / 10;

// Connectors whose bodies overlap: on one line each reaches an arm length towards
// its neighbour where it has an arm, half its width where it has none.
// Returns the indices into dd(L, "conns") that collide with another connector.
function dd_layout_clashes(L, p) =
    let(cs = dd(L, "conns"), n = len(cs), arm = dd(p, "arm"), aw = dd_arm_w(p),
        reach = function(d, i) d[i] ? arm : aw / 2,
        hit = function(a, b)
            let(sameY = abs(a[2] - b[2]) < dd_le(), sameX = abs(a[1] - b[1]) < dd_le(),
                lo = sameY ? (a[1] < b[1] ? a : b) : (a[2] < b[2] ? a : b),
                hi = lo == a ? b : a)
            sameY ? hi[1] - lo[1] < reach(lo[3], 0) + reach(hi[3], 2) + 1 - dd_le()
          : sameX ? hi[2] - lo[2] < reach(lo[3], 1) + reach(hi[3], 3) + 1 - dd_le()
          : false)
    [for (i = [0 : 1 : n - 1]) if (len([for (j = [0 : 1 : n - 1]) if (j != i && hit(cs[i], cs[j])) 1]) > 0) i];

// [[kind "c"|"w"|"r", spec, qty], ...] – connectors, then walls (longest first), then rails
function dd_layout_bom(L) =
    let(conns = dd(L, "conns"), walls = dd(L, "walls"), rails = dd(L, "rails"),
        ctypes = [for (c = conns) c[0]],
        lens   = [for (w = walls) if (w[4] > 0) dd_wall_len_round(w[4])],
        ulens  = dd_uniq_sorted(dd_sort(lens)),
        rspec  = [for (r = rails) [round(r[3] * 100) / 100, round(r[4] * 100) / 100, r[5], r[6], r[7]]])
    concat(
        [for (t = dd_connector_types()) if (dd_count(ctypes, t) > 0) ["c", t, dd_count(ctypes, t)]],
        [for (k = [len(ulens) - 1 : -1 : 0]) ["w", ulens[k], len([for (l = lens) if (abs(l - ulens[k]) < dd_le()) 1])]],
        [for (r = dd_unique(rspec)) ["r", r, dd_count(rspec, r)]]);
